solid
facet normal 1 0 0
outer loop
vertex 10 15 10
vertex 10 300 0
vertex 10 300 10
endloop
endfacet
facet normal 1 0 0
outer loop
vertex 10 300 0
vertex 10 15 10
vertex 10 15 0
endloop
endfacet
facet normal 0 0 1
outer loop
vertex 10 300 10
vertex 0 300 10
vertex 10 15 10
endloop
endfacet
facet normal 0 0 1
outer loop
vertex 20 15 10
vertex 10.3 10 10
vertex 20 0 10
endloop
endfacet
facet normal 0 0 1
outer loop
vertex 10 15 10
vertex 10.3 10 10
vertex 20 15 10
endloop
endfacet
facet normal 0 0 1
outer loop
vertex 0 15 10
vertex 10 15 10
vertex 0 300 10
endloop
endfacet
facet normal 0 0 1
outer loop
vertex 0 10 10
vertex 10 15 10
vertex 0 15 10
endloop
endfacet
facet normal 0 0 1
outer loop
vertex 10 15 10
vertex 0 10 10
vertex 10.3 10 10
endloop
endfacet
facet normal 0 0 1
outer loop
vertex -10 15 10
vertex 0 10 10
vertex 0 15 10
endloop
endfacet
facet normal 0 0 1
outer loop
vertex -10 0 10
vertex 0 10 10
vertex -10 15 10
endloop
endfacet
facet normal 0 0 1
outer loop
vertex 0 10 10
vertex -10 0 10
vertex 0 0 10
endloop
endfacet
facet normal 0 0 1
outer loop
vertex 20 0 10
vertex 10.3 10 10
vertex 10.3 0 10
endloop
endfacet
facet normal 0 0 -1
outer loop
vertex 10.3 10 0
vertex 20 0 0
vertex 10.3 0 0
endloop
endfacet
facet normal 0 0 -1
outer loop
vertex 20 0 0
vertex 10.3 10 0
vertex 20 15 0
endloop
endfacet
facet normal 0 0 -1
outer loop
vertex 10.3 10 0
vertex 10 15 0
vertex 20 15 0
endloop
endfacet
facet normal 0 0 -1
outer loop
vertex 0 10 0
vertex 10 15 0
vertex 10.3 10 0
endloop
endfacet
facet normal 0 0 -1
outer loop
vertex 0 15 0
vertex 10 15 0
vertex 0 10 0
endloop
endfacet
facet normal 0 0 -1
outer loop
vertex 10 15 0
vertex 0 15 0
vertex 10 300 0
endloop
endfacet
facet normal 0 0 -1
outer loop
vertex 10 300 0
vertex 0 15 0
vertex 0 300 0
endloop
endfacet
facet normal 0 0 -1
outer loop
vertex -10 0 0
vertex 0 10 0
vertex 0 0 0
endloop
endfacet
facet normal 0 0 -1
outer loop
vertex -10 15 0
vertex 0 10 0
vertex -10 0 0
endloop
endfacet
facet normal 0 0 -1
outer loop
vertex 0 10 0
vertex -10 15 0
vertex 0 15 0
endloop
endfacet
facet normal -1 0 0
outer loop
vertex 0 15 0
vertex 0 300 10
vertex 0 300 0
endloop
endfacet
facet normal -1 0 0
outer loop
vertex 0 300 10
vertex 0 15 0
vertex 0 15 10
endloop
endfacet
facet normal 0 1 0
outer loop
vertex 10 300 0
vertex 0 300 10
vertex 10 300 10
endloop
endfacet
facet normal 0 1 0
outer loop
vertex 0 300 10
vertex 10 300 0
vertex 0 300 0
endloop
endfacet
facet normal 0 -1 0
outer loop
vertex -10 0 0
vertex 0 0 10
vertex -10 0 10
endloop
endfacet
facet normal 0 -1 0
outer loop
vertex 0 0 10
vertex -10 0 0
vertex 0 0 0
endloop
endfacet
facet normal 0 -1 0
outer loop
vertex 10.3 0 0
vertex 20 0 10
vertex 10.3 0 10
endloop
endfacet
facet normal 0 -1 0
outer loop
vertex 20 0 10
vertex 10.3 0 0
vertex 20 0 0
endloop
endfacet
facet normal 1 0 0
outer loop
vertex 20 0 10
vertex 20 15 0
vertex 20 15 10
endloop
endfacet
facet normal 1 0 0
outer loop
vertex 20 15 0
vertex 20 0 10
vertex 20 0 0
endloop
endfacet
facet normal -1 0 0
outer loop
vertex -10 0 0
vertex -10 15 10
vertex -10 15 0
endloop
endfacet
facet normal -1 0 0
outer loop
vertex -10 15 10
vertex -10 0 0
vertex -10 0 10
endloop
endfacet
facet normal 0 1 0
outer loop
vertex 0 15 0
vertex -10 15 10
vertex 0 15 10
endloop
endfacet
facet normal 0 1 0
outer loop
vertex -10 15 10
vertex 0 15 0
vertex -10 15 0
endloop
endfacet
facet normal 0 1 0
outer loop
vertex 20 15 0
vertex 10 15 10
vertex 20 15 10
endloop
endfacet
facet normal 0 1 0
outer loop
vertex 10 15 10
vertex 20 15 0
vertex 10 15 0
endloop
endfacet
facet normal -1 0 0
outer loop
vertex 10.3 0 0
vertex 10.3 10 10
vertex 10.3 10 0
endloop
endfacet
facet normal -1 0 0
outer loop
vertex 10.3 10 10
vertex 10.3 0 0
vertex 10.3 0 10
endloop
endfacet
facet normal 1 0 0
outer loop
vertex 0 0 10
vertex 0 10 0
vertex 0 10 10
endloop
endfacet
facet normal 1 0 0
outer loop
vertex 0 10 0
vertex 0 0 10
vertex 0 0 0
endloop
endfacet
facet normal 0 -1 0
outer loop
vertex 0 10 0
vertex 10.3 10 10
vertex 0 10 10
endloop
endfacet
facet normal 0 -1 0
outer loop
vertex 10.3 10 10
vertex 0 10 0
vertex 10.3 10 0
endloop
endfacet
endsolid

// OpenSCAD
difference()
{
  union()
  {
    cube([10,300,10]);
    translate([-10,0,0]) cube([30,15,10]);
  }
  translate([0,-2,-2]) cube([10.3,12,15]);
}
